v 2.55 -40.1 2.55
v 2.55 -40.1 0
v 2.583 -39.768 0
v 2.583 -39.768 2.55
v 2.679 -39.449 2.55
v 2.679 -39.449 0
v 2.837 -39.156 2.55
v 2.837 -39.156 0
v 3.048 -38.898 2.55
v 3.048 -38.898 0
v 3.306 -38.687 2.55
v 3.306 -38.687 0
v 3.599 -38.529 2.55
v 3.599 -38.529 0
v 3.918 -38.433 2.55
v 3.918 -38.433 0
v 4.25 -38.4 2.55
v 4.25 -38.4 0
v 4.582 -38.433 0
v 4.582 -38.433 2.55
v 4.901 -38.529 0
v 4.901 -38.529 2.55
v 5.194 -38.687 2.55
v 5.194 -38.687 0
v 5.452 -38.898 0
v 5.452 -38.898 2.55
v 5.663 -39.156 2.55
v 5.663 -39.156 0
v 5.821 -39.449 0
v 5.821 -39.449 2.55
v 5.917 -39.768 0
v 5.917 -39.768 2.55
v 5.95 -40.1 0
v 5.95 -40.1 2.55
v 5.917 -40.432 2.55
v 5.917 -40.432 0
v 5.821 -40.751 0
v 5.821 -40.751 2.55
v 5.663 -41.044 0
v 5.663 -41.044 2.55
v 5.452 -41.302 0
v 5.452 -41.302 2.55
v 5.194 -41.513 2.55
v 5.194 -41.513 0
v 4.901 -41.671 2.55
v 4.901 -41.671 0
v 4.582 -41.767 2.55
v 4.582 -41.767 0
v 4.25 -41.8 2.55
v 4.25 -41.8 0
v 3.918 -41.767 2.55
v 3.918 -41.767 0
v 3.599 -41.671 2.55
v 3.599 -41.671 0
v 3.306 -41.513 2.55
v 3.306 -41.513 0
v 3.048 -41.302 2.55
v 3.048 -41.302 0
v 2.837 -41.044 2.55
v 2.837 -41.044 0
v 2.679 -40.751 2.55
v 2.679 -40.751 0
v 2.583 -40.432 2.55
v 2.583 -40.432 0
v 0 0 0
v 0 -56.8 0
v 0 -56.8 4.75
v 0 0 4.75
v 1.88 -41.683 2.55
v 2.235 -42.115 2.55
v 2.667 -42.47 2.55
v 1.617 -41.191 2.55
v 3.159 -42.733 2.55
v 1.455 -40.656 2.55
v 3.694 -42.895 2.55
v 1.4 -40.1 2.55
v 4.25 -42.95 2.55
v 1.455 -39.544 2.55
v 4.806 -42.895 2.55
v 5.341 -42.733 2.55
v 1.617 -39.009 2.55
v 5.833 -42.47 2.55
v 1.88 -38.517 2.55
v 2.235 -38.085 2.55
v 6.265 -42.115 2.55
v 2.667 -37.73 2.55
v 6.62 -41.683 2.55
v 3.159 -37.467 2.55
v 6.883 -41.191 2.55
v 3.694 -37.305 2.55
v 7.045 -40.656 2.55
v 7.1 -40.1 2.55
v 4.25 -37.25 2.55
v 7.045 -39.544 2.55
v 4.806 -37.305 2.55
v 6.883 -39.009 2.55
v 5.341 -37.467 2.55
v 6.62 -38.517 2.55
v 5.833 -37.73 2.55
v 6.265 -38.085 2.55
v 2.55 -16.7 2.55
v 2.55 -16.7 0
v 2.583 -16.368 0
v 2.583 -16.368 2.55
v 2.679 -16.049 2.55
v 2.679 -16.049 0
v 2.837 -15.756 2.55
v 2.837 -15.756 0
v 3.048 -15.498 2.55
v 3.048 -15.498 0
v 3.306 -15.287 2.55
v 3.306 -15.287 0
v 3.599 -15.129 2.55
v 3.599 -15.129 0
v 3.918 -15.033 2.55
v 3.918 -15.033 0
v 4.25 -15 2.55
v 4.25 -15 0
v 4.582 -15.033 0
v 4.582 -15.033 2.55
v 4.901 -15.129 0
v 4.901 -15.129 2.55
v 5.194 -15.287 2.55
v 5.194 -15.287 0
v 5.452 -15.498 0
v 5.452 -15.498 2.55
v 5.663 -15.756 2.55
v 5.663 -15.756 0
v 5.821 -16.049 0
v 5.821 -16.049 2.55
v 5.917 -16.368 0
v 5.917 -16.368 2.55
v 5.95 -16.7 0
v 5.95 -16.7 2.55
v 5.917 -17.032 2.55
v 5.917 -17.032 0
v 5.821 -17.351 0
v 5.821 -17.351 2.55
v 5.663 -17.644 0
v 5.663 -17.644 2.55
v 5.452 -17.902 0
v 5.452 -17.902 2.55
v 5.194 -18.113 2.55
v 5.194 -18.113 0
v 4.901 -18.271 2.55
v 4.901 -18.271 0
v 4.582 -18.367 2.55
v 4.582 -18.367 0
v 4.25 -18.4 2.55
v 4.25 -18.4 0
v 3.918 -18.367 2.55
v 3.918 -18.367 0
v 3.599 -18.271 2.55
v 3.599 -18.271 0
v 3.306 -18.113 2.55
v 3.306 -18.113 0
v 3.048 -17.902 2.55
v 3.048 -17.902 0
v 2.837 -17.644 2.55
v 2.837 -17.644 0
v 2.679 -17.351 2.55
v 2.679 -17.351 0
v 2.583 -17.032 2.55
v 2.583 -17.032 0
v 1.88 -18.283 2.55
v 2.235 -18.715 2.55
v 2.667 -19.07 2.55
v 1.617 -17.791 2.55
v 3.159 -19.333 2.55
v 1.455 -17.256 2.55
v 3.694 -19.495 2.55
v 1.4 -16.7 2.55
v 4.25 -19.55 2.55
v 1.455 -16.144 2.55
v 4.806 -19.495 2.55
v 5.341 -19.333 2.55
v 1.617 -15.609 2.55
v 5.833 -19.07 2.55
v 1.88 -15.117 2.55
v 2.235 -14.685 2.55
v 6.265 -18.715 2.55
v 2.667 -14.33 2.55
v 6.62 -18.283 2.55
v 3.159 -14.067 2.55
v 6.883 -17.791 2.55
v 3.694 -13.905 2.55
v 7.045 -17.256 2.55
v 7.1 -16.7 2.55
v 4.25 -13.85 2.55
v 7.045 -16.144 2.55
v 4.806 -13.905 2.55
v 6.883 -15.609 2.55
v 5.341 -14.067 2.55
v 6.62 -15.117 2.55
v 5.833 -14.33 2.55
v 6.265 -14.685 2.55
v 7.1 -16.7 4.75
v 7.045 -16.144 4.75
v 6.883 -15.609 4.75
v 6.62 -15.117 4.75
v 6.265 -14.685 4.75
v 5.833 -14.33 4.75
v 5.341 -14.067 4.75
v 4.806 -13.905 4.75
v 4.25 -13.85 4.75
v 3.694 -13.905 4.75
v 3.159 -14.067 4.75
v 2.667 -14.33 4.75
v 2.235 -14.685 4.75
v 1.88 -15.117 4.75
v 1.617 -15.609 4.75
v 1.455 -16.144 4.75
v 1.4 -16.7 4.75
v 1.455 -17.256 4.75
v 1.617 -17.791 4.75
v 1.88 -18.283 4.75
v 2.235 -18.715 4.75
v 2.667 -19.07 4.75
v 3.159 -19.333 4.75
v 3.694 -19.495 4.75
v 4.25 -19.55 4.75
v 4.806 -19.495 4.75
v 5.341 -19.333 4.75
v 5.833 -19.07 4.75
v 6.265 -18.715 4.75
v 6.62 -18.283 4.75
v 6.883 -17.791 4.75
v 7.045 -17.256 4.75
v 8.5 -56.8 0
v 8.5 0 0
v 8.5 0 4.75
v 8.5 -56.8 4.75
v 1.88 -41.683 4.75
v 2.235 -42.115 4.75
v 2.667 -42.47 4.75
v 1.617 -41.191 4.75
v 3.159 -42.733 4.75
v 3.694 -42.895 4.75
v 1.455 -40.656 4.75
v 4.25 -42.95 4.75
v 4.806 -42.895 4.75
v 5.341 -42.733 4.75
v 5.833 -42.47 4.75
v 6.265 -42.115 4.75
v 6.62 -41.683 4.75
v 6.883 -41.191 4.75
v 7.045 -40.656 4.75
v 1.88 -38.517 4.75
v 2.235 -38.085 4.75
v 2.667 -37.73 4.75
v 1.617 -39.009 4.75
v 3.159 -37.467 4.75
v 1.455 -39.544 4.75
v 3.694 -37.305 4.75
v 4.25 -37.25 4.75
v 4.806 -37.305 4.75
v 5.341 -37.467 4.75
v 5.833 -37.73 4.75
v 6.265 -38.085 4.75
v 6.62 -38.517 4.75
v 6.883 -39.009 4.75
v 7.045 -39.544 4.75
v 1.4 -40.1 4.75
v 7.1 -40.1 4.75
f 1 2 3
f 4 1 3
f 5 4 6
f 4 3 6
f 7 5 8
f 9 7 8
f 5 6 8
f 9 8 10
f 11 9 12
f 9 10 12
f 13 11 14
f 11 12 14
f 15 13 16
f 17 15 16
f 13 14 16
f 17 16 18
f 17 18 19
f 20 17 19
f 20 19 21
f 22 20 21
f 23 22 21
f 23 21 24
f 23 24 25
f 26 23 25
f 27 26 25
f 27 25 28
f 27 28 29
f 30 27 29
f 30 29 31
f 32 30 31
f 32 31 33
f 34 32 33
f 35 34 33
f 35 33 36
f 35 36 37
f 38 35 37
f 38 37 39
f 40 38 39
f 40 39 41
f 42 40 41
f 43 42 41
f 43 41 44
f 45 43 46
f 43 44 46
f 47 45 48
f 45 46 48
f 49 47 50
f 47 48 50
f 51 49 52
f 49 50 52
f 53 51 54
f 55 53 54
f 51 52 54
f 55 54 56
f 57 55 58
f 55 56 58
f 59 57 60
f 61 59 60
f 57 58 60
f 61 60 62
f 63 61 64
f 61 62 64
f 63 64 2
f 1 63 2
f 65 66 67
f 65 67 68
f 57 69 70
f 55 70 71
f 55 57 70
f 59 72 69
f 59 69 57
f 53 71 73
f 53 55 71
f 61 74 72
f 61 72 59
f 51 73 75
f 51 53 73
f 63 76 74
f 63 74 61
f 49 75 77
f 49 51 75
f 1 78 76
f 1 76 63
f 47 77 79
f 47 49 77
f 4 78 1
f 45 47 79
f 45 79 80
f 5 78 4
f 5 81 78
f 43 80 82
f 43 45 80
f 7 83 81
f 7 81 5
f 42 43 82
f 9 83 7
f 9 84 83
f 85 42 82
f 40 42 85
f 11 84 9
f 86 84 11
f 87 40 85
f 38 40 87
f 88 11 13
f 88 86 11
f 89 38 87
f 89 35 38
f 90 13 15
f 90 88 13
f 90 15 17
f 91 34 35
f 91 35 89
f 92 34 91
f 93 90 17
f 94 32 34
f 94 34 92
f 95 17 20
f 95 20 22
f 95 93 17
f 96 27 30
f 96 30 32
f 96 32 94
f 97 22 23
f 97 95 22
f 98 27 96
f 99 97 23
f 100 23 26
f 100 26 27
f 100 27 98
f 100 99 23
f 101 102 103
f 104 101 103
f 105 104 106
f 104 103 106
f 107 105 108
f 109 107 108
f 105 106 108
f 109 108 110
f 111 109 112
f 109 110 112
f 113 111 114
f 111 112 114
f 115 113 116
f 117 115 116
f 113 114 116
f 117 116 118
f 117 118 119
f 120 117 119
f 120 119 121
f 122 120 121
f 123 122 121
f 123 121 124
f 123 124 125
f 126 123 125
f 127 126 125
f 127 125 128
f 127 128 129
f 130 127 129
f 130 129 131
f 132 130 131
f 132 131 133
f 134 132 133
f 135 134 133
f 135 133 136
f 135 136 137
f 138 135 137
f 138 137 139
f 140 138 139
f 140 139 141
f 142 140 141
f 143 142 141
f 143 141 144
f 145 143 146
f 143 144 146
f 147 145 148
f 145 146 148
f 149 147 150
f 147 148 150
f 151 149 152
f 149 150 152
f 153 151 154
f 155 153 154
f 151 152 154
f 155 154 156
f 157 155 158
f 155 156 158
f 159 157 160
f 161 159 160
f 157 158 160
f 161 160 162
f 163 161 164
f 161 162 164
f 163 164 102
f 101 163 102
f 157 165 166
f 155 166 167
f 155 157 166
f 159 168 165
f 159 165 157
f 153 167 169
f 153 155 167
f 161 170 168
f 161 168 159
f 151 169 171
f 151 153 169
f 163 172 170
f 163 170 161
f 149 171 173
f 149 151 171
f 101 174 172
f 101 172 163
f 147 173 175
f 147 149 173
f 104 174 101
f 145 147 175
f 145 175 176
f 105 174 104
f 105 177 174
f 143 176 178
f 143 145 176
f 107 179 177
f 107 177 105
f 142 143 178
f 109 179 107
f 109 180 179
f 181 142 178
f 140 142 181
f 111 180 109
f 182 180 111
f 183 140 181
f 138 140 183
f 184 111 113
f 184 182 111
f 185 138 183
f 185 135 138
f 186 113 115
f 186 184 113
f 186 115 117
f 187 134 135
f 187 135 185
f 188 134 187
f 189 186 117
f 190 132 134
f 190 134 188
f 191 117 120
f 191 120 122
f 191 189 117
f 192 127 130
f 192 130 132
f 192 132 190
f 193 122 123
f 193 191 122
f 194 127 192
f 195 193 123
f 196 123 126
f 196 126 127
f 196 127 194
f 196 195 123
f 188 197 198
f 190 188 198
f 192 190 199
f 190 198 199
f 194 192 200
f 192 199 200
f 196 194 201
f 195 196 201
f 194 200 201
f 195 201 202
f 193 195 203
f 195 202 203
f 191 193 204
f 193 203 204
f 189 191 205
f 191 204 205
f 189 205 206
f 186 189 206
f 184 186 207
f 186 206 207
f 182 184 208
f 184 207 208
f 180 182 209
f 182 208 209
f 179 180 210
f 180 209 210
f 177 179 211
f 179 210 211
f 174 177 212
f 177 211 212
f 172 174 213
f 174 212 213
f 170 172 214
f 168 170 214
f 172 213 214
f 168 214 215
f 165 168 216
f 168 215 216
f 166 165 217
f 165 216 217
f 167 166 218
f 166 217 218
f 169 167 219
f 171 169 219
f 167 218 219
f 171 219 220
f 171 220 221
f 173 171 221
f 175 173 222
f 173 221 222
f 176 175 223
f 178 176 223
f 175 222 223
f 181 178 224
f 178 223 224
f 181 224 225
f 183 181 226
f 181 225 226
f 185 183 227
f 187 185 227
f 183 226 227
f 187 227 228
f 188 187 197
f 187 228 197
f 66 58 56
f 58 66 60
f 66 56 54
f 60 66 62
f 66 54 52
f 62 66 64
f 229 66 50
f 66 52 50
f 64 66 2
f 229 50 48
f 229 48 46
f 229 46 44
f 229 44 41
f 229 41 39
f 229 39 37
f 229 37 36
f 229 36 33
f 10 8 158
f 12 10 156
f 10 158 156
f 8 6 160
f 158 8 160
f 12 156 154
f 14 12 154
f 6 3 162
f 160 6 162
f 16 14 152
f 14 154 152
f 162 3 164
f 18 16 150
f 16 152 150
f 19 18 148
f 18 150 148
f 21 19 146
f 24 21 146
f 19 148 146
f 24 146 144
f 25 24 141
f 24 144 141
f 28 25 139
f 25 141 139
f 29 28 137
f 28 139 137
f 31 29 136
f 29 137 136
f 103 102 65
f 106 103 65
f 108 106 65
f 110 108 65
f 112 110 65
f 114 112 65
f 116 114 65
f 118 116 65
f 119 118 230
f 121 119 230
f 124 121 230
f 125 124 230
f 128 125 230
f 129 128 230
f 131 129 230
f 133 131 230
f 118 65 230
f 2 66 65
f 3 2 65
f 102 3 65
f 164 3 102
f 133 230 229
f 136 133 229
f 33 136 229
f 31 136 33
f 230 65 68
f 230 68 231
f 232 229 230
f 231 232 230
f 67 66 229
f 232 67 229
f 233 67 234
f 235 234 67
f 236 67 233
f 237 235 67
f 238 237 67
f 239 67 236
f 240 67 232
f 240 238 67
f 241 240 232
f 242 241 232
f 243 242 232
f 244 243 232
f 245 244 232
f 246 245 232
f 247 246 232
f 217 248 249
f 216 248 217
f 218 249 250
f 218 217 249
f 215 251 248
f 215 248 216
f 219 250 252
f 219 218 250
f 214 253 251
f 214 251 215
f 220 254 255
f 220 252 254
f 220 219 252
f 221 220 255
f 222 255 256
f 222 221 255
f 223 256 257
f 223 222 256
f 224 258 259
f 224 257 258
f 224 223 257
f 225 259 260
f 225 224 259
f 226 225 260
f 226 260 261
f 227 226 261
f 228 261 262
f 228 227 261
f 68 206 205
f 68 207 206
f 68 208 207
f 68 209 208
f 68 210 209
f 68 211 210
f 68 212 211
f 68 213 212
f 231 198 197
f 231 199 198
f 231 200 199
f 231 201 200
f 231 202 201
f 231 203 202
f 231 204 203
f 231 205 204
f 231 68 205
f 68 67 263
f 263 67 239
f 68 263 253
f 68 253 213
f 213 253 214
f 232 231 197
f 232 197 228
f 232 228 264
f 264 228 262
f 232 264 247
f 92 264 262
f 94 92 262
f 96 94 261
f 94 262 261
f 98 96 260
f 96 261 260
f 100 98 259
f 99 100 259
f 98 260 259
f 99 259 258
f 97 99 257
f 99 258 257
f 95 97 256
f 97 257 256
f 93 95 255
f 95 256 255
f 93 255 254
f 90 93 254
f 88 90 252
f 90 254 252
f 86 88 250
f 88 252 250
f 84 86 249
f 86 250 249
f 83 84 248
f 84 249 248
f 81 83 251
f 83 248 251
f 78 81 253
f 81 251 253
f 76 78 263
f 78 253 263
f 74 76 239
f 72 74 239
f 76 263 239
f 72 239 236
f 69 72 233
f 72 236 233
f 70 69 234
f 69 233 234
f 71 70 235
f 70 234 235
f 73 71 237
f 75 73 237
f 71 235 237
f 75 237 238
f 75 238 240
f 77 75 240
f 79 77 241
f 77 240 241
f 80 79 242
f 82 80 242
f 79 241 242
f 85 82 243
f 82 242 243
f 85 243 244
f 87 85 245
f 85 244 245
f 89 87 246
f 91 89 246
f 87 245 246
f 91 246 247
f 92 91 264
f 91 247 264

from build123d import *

# Parameters (mm, degrees)
SKETCH1_W                = 8.5
SKETCH1_H                = 56.8
BOSS_EXTRUDE1_DEPTH      = 4.75
M3_CLEARANCE_HOLE1_D     = 3.4
M3_CLEARANCE_HOLE1_DEPTH = 5
M3_CLEARANCE_HOLE1_TIP   = 1.021463052
SKETCH6_R                = 2.85
CUT_EXTRUDE1_DEPTH       = 2.2


with BuildPart() as part:
    # Sketch1 → Boss-Extrude1 (new body)
    with BuildSketch(Plane.XY):
        with Locations((4.25, -28.4)):
            Rectangle(SKETCH1_W, SKETCH1_H)
    extrude(amount=BOSS_EXTRUDE1_DEPTH)

    # M3 Clearance Hole1
    with Locations(Plane.XY.offset(4.75)):
        with Locations((4.25, -16.7), (4.25, -40.1)):
            Hole(M3_CLEARANCE_HOLE1_D / 2, depth=M3_CLEARANCE_HOLE1_DEPTH)
            with Locations((0, 0, -(M3_CLEARANCE_HOLE1_DEPTH + M3_CLEARANCE_HOLE1_TIP / 2))):  # 118° drill point
                Cone(0, M3_CLEARANCE_HOLE1_D / 2, M3_CLEARANCE_HOLE1_TIP, mode=Mode.SUBTRACT)

    # Sketch6 → Cut-Extrude1 (cut)
    with BuildSketch(Plane.XY.offset(4.75)):
        with Locations((4.25, -16.7)):
            Circle(SKETCH6_R)
        with Locations((4.25, -40.1)):
            Circle(SKETCH6_R)
    extrude(amount=-CUT_EXTRUDE1_DEPTH, mode=Mode.SUBTRACT)


solid = part.part
